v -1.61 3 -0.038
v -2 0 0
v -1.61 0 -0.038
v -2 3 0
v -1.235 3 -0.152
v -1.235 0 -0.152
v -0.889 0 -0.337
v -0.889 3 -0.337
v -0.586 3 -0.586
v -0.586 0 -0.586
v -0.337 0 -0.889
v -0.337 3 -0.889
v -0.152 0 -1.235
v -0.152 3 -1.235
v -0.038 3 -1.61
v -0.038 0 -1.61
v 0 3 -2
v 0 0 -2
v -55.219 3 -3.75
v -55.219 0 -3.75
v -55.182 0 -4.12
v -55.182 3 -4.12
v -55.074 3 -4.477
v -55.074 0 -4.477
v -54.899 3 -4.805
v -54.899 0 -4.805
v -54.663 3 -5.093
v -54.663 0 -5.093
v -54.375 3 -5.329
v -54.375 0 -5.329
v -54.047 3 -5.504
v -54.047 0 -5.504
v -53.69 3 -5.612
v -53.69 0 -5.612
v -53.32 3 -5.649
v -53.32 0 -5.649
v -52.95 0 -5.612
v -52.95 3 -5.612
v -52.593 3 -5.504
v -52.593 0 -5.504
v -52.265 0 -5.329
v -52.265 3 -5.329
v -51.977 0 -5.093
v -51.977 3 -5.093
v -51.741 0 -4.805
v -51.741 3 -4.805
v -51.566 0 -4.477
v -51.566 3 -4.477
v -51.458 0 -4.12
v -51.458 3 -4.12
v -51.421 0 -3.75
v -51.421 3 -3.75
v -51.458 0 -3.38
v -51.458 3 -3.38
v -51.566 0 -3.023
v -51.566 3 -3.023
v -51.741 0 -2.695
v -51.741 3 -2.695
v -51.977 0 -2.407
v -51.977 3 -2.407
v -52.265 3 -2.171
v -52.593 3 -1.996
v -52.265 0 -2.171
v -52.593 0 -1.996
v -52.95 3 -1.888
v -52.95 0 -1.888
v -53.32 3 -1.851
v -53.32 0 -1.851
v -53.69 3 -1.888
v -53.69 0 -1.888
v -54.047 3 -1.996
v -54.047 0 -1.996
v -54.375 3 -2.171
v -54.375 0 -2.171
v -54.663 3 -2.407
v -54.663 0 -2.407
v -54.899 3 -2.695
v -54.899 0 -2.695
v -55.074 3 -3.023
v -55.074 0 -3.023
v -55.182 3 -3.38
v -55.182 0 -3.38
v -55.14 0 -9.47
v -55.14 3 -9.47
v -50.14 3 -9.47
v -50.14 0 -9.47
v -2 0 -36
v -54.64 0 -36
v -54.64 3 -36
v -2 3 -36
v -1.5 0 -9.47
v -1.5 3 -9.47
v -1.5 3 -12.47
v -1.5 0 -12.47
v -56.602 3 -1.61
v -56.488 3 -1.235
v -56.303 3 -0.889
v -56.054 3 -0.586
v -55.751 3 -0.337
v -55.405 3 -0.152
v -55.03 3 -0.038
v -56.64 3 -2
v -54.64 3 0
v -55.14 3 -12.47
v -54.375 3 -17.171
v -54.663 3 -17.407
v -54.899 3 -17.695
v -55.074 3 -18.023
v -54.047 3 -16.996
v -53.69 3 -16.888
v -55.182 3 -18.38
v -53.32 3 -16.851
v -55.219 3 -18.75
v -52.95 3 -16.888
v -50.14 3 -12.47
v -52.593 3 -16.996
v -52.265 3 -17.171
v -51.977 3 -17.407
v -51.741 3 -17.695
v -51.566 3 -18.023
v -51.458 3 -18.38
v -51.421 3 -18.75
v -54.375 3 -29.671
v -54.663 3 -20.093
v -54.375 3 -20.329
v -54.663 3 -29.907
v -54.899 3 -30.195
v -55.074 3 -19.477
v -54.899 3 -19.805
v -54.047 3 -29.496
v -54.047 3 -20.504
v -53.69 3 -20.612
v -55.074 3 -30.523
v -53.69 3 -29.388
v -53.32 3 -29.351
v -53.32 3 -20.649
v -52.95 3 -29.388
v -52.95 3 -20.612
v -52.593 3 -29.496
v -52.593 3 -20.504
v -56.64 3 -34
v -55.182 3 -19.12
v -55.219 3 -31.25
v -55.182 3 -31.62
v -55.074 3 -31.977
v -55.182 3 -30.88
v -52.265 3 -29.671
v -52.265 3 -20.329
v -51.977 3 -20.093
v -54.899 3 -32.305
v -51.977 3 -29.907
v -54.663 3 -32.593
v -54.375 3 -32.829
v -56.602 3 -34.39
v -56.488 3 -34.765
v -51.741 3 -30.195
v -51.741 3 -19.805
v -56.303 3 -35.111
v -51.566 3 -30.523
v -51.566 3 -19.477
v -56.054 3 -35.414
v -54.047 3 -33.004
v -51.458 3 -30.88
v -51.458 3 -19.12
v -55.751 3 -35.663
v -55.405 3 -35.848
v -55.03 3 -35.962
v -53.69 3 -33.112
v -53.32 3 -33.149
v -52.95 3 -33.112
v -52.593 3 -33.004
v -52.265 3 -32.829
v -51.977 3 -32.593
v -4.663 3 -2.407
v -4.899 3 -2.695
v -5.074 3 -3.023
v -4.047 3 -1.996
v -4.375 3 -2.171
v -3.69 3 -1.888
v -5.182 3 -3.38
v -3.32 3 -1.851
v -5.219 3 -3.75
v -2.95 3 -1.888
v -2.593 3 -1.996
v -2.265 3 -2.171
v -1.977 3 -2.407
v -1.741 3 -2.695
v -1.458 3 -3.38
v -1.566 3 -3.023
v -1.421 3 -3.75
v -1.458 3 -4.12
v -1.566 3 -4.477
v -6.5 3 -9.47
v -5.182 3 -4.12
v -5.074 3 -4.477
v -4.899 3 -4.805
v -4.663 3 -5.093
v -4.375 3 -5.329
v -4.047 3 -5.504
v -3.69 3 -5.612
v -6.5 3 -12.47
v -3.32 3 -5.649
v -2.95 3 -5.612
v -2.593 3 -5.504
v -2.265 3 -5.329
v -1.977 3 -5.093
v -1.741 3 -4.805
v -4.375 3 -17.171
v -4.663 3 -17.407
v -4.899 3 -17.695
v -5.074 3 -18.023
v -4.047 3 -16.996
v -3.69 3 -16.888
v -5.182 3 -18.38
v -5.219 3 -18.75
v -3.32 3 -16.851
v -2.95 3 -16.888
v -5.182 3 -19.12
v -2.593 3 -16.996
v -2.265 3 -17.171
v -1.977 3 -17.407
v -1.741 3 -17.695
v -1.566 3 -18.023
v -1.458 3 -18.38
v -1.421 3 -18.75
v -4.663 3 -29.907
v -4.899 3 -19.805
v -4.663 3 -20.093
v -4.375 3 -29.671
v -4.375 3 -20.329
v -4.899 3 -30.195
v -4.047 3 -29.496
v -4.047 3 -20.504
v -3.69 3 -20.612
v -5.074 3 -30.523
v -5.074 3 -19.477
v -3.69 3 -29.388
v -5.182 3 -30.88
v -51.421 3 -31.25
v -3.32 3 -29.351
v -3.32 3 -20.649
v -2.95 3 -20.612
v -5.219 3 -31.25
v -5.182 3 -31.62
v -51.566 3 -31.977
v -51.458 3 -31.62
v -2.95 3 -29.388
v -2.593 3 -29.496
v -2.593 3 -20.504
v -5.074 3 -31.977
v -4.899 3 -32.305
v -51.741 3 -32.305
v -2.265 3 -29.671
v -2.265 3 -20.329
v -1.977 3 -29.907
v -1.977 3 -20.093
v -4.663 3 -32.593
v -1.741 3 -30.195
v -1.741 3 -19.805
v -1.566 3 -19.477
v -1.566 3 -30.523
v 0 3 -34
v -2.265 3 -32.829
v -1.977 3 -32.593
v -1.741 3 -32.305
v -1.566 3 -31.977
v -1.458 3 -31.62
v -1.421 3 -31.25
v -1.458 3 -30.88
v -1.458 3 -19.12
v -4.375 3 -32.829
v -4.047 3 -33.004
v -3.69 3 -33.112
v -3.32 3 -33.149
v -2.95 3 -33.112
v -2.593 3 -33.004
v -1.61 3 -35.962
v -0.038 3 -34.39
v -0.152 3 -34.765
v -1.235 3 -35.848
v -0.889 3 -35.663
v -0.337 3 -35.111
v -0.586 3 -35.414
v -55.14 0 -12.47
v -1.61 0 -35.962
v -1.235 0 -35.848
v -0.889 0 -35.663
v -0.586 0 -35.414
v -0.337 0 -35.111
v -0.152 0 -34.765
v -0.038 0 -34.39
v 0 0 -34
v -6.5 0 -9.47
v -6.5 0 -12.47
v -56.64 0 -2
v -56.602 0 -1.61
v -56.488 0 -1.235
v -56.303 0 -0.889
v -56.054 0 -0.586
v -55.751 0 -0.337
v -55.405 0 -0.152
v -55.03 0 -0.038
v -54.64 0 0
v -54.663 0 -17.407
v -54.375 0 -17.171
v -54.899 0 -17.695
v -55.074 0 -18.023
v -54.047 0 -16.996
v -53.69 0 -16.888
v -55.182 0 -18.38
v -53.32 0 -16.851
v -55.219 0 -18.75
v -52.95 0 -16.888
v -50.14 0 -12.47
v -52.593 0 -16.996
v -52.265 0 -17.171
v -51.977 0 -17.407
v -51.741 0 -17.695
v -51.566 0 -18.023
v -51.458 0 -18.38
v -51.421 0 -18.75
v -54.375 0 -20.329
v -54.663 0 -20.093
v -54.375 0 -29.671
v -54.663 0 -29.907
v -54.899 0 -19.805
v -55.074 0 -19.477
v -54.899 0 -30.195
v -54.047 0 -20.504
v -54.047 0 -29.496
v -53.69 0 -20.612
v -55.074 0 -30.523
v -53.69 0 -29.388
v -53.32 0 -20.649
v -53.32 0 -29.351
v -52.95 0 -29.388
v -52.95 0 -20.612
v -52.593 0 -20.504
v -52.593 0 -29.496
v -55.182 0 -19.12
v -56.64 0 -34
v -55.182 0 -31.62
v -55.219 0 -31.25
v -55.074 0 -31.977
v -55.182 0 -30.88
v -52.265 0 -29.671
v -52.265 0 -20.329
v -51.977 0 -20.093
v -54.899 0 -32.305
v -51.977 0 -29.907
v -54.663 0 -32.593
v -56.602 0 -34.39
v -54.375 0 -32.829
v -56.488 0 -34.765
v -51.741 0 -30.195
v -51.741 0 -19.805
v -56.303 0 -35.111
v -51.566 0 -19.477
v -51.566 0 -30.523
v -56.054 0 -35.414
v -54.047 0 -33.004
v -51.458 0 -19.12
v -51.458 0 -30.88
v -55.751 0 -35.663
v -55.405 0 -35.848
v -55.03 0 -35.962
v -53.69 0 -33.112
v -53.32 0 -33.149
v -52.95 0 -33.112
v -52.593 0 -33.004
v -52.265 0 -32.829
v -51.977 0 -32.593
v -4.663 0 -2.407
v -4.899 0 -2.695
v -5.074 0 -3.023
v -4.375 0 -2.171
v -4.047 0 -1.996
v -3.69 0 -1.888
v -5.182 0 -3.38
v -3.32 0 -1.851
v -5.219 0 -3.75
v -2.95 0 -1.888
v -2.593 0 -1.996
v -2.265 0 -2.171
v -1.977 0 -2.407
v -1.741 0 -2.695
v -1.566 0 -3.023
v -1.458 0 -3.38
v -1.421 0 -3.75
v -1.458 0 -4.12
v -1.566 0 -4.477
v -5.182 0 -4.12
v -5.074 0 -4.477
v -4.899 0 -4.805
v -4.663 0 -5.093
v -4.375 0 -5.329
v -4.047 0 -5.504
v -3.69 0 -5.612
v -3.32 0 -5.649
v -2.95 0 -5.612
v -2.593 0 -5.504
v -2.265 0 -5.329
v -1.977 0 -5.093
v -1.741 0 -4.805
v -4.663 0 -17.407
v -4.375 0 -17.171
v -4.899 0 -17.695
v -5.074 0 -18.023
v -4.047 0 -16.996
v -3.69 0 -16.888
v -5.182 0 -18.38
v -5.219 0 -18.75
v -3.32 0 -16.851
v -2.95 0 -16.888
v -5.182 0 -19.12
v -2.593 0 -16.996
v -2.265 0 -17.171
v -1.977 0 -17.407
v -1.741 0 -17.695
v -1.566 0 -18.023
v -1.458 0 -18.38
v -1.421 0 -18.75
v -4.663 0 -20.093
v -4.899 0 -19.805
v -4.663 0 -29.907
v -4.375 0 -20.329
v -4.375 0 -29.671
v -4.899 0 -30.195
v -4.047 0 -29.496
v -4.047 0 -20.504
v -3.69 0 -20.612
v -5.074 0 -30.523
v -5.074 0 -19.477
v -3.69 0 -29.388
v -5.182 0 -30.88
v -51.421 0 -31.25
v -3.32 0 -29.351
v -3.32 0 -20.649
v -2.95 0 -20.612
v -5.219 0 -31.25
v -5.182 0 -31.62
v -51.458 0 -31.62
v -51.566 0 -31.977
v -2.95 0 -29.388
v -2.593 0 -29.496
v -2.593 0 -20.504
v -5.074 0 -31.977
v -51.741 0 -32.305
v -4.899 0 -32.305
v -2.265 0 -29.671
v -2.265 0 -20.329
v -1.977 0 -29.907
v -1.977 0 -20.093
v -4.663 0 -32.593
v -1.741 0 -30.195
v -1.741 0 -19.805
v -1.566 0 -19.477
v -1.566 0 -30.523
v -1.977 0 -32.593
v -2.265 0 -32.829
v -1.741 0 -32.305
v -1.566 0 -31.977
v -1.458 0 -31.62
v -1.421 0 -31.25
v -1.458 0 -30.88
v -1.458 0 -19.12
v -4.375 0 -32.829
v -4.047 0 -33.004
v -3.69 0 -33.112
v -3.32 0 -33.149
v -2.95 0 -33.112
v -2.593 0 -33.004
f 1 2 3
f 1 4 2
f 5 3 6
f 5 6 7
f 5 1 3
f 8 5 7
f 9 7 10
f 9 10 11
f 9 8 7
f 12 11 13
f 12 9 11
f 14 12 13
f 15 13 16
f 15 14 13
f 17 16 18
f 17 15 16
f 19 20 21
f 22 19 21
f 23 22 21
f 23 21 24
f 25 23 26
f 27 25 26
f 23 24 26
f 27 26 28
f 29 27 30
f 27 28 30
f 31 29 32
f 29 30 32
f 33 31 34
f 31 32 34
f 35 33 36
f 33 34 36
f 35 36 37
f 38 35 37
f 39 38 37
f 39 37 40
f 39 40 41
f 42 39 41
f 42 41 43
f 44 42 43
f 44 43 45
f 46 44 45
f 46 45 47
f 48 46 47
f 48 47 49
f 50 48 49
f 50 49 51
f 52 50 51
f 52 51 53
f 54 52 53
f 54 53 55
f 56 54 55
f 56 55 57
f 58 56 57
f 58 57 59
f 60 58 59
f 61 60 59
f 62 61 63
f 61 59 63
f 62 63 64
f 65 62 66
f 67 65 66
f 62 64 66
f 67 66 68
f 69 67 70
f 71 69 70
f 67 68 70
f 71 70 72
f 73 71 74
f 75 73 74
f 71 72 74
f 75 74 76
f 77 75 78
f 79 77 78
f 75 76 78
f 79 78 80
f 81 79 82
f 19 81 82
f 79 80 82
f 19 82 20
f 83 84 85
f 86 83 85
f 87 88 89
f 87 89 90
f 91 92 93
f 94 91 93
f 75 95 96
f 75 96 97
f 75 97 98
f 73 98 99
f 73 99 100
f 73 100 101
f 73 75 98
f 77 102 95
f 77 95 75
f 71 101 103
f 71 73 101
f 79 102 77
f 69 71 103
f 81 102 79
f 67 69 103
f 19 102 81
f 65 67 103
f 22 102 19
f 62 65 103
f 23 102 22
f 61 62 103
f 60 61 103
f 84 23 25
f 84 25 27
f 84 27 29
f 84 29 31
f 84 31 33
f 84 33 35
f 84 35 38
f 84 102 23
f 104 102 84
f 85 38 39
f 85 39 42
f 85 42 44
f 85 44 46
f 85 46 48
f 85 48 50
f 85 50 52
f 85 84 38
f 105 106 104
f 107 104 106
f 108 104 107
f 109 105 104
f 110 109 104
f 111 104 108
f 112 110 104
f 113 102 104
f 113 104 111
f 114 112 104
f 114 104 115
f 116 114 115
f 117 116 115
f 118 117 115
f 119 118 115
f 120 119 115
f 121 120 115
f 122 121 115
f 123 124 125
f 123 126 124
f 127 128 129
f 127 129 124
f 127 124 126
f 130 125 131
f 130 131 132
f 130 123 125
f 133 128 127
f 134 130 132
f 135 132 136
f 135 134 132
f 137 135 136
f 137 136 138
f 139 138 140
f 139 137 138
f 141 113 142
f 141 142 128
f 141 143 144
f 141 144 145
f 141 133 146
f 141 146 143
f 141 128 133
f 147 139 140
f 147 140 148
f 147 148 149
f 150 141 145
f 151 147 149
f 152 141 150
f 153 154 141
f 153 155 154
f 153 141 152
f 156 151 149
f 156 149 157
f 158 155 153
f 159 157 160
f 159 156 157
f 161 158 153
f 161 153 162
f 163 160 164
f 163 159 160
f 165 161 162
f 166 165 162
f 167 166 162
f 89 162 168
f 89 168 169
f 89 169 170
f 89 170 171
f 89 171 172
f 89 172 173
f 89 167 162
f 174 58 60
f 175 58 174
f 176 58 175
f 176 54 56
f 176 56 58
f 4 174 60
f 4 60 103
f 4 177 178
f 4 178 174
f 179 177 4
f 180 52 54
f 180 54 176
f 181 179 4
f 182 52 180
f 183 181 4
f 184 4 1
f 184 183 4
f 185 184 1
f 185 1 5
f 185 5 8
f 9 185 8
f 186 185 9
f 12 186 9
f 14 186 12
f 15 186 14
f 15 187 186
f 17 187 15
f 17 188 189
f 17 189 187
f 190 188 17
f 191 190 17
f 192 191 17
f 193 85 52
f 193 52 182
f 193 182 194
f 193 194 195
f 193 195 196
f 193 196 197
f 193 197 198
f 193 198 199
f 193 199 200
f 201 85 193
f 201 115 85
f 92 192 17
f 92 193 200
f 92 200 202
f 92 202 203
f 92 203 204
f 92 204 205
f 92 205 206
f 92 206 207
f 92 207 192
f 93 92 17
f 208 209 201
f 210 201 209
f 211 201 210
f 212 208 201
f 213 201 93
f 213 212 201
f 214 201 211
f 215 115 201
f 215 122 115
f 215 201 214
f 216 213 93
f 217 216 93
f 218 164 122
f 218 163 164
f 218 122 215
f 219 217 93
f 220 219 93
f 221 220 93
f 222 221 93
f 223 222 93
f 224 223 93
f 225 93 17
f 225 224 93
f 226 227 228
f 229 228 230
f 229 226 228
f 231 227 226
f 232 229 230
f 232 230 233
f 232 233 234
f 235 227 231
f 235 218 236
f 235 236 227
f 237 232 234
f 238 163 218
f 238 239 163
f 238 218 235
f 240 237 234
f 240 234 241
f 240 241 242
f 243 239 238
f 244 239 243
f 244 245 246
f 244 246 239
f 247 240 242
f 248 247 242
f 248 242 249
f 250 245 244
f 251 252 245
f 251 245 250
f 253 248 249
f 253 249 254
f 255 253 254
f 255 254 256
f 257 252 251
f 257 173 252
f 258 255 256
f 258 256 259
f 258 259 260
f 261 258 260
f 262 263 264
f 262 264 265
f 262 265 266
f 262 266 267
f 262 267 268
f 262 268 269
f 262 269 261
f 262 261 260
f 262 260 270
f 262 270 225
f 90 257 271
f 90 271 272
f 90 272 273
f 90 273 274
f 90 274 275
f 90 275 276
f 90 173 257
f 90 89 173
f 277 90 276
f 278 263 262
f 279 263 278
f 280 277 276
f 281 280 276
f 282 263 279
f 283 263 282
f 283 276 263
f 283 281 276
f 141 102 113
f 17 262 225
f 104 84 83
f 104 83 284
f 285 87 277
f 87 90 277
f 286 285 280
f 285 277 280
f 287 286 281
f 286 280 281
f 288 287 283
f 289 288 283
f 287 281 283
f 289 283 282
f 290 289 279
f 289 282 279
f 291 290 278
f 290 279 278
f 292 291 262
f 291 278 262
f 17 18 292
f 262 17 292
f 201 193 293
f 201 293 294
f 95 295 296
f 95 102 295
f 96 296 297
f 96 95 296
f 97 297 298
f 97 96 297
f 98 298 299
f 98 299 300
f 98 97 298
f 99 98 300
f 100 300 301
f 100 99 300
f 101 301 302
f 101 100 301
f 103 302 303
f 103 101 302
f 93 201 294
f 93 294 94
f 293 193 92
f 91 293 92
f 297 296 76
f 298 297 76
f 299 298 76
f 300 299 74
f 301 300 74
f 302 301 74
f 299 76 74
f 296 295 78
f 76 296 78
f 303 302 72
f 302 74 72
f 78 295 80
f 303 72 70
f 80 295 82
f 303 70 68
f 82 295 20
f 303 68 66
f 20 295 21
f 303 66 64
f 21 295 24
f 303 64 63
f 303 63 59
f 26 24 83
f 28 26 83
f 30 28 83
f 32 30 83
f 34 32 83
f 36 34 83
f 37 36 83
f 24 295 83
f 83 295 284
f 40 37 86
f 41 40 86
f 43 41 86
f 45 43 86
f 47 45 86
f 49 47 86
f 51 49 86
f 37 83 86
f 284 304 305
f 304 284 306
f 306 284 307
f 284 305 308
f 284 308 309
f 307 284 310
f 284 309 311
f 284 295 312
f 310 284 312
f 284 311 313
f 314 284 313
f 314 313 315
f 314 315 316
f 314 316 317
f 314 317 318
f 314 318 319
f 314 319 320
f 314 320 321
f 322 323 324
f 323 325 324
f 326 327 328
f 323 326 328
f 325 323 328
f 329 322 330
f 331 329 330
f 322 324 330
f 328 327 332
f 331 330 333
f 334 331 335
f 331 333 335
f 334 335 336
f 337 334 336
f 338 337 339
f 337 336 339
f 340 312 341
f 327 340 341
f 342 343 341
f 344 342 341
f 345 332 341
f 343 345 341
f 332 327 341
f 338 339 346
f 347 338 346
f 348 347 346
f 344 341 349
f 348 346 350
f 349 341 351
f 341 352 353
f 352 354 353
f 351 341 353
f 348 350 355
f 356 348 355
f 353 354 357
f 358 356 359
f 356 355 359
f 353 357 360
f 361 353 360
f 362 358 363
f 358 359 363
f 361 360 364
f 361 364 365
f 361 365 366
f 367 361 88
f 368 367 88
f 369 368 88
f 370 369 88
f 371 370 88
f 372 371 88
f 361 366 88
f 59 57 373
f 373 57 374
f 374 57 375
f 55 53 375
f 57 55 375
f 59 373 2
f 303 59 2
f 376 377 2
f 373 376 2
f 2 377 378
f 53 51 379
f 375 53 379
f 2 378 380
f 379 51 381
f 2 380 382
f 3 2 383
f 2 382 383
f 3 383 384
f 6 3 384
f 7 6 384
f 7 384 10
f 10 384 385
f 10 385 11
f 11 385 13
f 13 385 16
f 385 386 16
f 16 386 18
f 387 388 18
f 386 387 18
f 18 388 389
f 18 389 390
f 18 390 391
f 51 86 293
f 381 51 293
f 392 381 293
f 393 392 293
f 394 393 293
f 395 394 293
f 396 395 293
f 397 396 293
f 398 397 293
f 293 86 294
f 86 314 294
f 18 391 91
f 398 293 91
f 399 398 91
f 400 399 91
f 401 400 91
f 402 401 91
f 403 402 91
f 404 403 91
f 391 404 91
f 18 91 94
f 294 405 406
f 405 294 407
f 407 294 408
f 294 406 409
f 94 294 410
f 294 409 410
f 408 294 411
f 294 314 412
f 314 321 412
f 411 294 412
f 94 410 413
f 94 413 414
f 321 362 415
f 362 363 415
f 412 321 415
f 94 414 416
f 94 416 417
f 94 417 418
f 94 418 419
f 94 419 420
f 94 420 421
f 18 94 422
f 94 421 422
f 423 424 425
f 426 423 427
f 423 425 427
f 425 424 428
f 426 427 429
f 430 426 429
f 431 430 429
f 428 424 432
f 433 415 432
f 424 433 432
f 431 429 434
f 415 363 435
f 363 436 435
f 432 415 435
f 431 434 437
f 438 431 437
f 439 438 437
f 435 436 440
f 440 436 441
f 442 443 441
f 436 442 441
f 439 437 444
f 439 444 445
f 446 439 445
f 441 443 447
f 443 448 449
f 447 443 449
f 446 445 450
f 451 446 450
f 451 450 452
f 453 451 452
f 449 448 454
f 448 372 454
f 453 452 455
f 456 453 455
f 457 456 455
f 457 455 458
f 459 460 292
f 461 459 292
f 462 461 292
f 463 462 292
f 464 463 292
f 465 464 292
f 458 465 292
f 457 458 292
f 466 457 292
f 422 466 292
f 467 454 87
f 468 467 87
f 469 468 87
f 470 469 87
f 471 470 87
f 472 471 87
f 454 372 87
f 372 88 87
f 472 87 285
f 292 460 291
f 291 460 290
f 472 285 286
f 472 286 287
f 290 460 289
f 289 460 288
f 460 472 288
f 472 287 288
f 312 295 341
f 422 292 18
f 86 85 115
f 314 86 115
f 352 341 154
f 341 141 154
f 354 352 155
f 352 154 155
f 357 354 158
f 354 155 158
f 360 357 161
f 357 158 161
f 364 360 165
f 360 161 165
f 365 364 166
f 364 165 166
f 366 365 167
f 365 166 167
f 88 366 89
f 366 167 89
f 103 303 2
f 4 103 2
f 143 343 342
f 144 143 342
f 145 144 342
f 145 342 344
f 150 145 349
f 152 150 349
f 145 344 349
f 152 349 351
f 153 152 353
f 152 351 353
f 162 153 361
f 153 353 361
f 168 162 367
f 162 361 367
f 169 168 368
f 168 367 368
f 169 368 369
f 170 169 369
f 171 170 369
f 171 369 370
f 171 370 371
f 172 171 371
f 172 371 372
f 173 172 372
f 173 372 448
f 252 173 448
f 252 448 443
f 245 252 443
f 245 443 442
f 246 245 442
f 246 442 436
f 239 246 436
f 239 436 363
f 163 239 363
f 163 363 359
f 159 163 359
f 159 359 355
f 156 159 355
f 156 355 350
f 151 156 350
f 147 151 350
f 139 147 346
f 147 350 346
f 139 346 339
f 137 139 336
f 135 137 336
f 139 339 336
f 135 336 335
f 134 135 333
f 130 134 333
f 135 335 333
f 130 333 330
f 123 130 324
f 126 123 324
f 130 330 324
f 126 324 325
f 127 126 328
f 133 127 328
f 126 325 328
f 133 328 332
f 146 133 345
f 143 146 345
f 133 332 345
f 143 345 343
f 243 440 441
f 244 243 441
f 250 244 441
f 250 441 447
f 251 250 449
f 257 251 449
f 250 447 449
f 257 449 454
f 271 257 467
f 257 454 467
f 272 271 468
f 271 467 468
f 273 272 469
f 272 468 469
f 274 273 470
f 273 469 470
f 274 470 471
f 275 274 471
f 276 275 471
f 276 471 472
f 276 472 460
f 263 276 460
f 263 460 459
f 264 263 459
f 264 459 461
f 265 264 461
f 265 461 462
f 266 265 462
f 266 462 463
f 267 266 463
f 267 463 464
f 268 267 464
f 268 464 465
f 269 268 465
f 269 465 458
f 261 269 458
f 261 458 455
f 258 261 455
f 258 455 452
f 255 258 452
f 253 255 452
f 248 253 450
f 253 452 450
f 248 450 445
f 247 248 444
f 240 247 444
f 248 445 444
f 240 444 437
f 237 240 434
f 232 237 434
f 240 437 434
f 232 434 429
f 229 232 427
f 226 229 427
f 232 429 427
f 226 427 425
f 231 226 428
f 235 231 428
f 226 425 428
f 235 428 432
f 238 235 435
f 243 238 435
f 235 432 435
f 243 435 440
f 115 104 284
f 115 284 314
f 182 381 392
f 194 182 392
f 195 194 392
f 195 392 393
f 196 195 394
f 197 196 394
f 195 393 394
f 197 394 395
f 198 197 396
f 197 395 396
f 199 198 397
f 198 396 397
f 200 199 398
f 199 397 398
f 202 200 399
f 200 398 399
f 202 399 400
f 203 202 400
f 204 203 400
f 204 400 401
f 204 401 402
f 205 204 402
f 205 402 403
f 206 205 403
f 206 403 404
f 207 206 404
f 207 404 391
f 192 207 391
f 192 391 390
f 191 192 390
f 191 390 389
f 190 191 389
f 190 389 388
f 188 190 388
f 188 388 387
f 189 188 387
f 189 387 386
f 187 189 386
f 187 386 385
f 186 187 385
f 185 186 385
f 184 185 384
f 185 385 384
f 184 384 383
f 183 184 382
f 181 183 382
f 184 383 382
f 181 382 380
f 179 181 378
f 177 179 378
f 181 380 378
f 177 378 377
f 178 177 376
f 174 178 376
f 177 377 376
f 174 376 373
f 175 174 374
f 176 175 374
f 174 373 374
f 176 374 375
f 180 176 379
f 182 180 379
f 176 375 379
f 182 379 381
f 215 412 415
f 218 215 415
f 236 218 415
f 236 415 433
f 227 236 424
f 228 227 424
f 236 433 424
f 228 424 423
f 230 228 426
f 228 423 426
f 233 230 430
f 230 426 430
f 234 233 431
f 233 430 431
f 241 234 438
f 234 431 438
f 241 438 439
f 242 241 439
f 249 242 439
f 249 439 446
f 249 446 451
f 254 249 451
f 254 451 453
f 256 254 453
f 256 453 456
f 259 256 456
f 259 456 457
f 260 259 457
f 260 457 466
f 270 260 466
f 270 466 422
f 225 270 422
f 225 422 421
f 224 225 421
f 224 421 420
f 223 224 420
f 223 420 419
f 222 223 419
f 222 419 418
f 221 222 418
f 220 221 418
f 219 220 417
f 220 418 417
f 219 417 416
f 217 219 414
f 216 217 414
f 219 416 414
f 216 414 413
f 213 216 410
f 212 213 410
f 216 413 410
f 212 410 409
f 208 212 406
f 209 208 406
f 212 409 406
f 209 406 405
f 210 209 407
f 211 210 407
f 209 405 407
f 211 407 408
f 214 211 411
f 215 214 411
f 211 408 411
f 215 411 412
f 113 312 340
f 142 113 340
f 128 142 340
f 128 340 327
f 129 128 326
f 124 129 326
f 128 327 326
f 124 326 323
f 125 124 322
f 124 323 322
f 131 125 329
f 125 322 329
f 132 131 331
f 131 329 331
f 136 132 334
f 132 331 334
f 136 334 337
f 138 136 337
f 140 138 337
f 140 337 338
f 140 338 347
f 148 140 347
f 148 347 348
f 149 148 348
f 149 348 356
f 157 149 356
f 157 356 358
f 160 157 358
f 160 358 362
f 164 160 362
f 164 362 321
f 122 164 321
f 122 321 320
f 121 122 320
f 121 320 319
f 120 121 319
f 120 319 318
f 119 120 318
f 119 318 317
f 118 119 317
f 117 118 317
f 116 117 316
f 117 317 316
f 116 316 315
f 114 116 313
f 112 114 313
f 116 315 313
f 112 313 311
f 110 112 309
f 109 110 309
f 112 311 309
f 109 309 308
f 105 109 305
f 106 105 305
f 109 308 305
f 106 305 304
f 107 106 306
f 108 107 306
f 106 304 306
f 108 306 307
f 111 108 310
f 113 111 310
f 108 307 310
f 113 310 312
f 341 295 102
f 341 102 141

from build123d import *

# Parameters (mm, degrees)
SKETCH1_W             = 56.64
SKETCH1_H             = 36
BOSS_EXTRUDE1_DEPTH   = 3
F_6_CLEARANCE_HOLE2_D = 3.7973
SKETCH7_W             = 5
SKETCH7_H             = 3
CUT_EXTRUDE1_DEPTH    = 10
FILLET1_R             = 2


with BuildPart() as part:
    # Sketch1 → Boss-Extrude1 (new body)
    with BuildSketch(Plane(origin=(0, 0, 0), x_dir=(1, 0, 0), z_dir=(0, 1, 0))):
        with Locations((-28.32, 18)):
            Rectangle(SKETCH1_W, SKETCH1_H)
    extrude(amount=BOSS_EXTRUDE1_DEPTH)

    # #6 Clearance Hole2 (through all)
    with Locations(Plane(origin=(0, 3, 0), x_dir=(1, 0, 0), z_dir=(0, 1, 0))):
        with Locations((-53.32, 31.25), (-53.32, 18.75), (-53.32, 3.75), (-3.32, 31.25), (-3.32, 18.75), (-3.32, 3.75)):
            Hole(F_6_CLEARANCE_HOLE2_D / 2)

    # Sketch7 → Cut-Extrude1 (cut)
    with BuildSketch(Plane(origin=(0, 3, 0), x_dir=(1, 0, 0), z_dir=(0, 1, 0))):
        with Locations((-52.64, 10.97)):
            Rectangle(SKETCH7_W, SKETCH7_H)
        with Locations((-4, 10.97)):
            Rectangle(SKETCH7_W, SKETCH7_H)
    extrude(amount=-CUT_EXTRUDE1_DEPTH, mode=Mode.SUBTRACT)

    # Fillet1
    fillet1_edges = [part.edges().sort_by_distance(p)[0] for p in [
        (0, 1.5, 0),
        (-56.64, 1.5, 0),
        (-56.64, 1.5, -36),
        (0, 1.5, -36),
    ]]
    fillet(fillet1_edges, radius=FILLET1_R)


solid = part.part
